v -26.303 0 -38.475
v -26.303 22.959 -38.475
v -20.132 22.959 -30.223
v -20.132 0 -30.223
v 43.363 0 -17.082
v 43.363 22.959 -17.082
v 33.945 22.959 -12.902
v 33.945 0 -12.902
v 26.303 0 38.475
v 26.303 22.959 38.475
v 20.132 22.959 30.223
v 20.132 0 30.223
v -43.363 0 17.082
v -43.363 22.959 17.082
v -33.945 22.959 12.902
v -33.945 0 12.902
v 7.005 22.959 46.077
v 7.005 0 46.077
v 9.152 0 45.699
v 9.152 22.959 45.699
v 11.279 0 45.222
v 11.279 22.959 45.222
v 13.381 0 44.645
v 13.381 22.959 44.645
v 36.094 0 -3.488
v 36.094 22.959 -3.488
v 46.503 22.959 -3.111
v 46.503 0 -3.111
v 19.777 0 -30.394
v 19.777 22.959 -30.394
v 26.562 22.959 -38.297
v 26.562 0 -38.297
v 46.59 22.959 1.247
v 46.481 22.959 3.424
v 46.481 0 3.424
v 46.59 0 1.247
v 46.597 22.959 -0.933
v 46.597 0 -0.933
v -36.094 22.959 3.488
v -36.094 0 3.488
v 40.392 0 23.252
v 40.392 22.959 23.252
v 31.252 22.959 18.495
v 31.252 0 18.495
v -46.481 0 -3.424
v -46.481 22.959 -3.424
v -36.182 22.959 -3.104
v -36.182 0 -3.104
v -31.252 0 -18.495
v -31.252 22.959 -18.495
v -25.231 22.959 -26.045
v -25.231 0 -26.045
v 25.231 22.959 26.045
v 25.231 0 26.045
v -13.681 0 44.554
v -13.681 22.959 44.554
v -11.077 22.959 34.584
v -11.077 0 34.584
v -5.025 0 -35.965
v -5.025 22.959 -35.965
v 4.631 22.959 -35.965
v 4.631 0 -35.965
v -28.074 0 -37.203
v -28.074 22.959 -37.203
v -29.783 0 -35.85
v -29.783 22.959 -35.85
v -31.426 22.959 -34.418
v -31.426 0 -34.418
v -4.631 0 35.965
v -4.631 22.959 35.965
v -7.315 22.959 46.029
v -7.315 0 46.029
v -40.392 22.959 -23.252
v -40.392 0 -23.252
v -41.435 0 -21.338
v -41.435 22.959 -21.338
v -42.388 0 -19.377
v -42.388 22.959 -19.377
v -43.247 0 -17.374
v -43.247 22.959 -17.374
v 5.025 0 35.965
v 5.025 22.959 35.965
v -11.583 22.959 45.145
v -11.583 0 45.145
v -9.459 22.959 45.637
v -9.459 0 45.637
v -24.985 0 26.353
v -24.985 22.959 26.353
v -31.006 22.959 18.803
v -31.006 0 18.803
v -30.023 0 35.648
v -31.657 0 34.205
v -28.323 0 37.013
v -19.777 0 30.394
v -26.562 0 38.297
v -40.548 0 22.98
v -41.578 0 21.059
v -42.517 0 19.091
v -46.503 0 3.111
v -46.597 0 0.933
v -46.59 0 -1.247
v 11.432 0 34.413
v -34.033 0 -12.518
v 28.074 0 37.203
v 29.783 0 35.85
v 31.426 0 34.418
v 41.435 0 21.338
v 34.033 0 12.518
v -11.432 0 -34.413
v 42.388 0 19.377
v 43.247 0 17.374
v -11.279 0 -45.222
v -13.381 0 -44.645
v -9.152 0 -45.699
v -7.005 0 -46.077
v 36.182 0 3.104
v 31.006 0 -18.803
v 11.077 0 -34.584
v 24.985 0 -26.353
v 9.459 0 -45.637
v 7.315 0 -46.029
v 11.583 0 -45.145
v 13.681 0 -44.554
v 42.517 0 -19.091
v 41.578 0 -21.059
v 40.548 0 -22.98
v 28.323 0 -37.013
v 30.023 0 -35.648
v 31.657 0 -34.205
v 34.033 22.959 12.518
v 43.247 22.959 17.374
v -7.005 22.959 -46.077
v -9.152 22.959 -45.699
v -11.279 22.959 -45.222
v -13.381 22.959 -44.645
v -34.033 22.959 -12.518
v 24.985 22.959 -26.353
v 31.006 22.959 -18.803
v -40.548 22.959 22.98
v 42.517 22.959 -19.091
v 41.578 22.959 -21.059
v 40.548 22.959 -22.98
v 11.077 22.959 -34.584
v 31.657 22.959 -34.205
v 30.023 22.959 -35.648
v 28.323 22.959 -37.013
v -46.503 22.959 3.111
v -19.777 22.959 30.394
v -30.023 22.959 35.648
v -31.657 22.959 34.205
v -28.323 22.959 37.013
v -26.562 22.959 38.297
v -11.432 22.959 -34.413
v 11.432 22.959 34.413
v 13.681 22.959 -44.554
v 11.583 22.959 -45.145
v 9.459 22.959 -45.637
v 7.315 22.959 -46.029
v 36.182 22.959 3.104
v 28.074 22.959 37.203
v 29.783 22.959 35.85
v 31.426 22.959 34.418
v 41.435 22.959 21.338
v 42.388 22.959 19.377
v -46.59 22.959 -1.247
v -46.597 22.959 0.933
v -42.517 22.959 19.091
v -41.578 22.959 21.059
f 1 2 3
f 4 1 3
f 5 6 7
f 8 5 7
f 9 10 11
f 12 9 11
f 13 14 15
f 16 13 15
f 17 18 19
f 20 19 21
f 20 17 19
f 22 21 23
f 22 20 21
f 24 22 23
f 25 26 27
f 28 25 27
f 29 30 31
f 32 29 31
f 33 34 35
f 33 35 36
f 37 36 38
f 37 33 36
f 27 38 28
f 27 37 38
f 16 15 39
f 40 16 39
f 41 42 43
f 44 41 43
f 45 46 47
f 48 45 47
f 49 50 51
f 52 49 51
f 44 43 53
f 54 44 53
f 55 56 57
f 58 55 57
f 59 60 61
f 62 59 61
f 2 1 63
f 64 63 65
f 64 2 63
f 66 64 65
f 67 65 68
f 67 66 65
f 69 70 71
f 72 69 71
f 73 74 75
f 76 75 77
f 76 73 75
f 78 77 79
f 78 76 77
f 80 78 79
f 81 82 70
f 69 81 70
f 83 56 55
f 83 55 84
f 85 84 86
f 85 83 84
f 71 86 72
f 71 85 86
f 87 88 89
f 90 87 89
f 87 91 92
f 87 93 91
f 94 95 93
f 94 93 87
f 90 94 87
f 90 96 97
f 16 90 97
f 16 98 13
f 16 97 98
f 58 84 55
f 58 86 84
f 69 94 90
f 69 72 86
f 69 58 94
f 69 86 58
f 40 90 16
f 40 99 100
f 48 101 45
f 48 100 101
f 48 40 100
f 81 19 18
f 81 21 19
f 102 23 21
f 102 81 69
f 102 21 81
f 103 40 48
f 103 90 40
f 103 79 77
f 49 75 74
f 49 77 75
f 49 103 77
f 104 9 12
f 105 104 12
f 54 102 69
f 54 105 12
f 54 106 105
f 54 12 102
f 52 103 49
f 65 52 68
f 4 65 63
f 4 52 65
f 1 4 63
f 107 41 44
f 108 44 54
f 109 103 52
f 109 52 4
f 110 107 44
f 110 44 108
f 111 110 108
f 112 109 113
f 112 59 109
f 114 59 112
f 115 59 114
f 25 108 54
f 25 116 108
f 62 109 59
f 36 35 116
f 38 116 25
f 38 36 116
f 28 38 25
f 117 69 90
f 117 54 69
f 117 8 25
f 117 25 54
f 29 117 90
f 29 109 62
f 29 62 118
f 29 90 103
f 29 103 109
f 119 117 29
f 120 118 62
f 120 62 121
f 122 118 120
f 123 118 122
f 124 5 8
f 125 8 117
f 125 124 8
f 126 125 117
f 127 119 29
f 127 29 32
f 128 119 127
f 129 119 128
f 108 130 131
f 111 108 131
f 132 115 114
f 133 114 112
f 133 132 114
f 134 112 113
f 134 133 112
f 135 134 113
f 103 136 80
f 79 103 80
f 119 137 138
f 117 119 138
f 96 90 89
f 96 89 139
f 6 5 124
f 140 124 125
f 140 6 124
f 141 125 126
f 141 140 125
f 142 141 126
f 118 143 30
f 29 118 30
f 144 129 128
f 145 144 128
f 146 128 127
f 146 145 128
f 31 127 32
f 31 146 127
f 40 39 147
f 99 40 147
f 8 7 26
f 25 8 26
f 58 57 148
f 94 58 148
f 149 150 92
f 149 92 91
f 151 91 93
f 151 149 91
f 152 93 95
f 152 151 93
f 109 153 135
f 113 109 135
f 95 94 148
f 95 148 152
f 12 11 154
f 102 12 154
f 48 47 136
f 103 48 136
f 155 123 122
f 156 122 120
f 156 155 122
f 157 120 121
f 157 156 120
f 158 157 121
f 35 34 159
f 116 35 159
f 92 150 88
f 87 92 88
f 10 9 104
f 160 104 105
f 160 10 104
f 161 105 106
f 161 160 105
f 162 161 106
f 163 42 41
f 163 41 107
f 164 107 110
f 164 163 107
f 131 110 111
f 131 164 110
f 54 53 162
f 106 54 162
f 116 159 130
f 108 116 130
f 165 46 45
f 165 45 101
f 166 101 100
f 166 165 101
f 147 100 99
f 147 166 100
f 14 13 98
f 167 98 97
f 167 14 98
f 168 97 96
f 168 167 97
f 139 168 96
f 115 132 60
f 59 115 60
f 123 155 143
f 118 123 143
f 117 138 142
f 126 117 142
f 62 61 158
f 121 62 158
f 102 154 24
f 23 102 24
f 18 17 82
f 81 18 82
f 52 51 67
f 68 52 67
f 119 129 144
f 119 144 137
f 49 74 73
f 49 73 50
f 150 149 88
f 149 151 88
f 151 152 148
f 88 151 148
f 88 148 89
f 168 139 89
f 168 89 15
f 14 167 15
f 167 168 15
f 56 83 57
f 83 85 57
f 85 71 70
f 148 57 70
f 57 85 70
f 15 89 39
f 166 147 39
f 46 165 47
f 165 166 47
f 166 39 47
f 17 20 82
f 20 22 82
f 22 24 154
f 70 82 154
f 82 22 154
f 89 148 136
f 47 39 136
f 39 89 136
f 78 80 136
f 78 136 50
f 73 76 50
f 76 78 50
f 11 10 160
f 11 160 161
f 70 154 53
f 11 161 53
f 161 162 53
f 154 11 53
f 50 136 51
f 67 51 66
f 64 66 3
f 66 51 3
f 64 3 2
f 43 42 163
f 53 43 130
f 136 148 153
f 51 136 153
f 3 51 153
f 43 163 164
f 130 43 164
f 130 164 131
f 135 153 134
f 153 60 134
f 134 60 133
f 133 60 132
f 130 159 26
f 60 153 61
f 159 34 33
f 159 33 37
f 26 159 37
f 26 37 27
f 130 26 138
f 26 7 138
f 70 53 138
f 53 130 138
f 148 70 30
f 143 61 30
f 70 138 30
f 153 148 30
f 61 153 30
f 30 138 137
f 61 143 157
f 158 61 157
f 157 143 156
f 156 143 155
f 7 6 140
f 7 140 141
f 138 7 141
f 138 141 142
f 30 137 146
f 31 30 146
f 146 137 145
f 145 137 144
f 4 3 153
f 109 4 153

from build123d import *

# Parameters (mm, degrees)
F0_W     = 22.9585338384
F0_H     = 46.6068126261
F3_DEPTH = 25.4
F4_COUNT = 14


with BuildPart() as f1:
    # F0 (on Right) → F1 (revolve)
    with BuildSketch(Plane.YZ):
        with Locations((11.4792669192, 23.3034063131)):
            Rectangle(F0_W, F0_H)
    revolve(axis=Axis((0, 11.4792669192, 0), (0, 1, 0)))

    # F2 (on face) → F3 (cut)
    with BuildSketch(Plane(origin=(0, 22.9585338384, 0), x_dir=(-1, 0, 0), z_dir=(0, 1, 0))):
        with BuildLine():
            ThreePointArc((7.3147966582, 46.0292160808), (0.1568637228, 46.6065486487), (-7.004793259, 46.0774115437))
            Line((-7.004793259, 46.0774115437), (-5.0252592191, 35.9650850296))
            Line((-5.0252592191, 35.9650850296), (0, 35.9650850296))
            Line((0, 35.9650850296), (4.6311216429, 35.9650850296))
            Line((4.6311216429, 35.9650850296), (7.3147966582, 46.0292160808))
        make_face()
    f3 = extrude(amount=-F3_DEPTH, mode=Mode.SUBTRACT)

    # F4: F3 ×14 about axis
    f4_axis = Axis((0, 11.4792669192, 0), (0, 1, 0))
    for i in range(1, F4_COUNT):
        add(f3.rotate(f4_axis, i * 360 / F4_COUNT), mode=Mode.SUBTRACT)


solid = f1.part
